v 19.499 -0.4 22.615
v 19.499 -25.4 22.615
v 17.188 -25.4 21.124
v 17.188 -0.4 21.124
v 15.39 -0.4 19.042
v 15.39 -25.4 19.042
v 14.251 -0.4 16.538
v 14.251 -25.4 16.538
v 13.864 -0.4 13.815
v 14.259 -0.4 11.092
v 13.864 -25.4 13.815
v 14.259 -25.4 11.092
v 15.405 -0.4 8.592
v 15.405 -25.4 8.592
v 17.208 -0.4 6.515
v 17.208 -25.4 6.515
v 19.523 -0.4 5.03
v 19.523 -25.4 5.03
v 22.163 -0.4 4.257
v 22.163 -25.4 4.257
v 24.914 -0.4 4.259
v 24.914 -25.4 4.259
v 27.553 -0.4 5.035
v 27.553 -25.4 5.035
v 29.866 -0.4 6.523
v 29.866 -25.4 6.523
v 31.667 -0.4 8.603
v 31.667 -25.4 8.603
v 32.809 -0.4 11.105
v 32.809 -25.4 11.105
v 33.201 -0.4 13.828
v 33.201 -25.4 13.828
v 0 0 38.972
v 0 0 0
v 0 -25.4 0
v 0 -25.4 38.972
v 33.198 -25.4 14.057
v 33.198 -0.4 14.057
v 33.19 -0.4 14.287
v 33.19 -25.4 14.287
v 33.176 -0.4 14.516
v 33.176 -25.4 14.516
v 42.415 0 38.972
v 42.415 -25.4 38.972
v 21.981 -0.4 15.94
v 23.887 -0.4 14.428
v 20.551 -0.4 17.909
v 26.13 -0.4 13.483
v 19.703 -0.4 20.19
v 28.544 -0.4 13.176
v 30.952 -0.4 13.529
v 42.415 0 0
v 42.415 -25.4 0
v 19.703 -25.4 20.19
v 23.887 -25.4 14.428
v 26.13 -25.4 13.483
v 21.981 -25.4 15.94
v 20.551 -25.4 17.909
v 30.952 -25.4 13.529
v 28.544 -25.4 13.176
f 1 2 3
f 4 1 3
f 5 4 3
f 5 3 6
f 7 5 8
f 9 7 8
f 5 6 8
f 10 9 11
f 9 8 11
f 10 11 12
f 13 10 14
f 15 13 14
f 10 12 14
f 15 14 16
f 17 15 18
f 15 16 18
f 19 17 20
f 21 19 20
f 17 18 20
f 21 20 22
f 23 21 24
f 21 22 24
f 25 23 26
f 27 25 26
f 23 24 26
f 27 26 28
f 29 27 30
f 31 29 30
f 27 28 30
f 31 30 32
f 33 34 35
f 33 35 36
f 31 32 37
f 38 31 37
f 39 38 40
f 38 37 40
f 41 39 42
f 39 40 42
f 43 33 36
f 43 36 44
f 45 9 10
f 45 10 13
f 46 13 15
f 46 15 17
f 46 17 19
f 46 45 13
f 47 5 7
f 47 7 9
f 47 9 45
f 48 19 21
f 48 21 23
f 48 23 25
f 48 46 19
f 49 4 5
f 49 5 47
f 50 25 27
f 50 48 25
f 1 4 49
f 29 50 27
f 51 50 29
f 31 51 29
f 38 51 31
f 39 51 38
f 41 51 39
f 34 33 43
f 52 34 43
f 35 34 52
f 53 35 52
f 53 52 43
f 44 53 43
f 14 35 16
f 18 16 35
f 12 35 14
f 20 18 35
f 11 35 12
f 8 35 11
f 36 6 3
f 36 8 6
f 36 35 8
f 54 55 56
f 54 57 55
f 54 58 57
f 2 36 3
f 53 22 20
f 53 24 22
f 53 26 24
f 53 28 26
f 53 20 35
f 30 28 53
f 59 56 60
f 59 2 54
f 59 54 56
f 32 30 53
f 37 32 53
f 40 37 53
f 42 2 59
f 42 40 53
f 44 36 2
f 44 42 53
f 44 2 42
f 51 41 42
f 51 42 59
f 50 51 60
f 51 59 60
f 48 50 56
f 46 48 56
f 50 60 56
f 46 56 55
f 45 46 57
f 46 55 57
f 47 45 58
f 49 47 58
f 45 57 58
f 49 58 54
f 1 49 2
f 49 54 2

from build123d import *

# Parameters (mm, degrees)
F0_W     = 42.4149371684
F0_H     = 38.9721691608
F1_DEPTH = 25.4
F5_DEPTH = 25


# Not quite as in the source:
# - the program builds the solid bodies; features that only make, move or delete a surface that nothing else refers to are left out


with BuildPart() as f1:
    # F0 (on Front) → F1 (new body)
    with BuildSketch(Plane.XZ):
        with Locations((21.2074685842, 19.4860845804)):
            Rectangle(F0_W, F0_H)
    extrude(amount=F1_DEPTH)

    # F4 (on face) → F5 (cut)
    with BuildSketch(Plane.XZ.offset(25.4)):
        with BuildLine():
            ThreePointArc((19.4994620307, 22.614925386), (18.3126908163, 5.6894142875), (33.200540329, 13.8277979568))
            ThreePointArc((33.200540329, 13.8277979568), (33.1944083659, 14.1720857887), (33.176020255, 14.5159369041))
            ThreePointArc((33.176020255, 14.5159369041), (23.8873414039, 14.4275027139), (19.4994620307, 22.614925386))
        make_face()
    extrude(amount=-F5_DEPTH, mode=Mode.SUBTRACT)


solid = f1.part
